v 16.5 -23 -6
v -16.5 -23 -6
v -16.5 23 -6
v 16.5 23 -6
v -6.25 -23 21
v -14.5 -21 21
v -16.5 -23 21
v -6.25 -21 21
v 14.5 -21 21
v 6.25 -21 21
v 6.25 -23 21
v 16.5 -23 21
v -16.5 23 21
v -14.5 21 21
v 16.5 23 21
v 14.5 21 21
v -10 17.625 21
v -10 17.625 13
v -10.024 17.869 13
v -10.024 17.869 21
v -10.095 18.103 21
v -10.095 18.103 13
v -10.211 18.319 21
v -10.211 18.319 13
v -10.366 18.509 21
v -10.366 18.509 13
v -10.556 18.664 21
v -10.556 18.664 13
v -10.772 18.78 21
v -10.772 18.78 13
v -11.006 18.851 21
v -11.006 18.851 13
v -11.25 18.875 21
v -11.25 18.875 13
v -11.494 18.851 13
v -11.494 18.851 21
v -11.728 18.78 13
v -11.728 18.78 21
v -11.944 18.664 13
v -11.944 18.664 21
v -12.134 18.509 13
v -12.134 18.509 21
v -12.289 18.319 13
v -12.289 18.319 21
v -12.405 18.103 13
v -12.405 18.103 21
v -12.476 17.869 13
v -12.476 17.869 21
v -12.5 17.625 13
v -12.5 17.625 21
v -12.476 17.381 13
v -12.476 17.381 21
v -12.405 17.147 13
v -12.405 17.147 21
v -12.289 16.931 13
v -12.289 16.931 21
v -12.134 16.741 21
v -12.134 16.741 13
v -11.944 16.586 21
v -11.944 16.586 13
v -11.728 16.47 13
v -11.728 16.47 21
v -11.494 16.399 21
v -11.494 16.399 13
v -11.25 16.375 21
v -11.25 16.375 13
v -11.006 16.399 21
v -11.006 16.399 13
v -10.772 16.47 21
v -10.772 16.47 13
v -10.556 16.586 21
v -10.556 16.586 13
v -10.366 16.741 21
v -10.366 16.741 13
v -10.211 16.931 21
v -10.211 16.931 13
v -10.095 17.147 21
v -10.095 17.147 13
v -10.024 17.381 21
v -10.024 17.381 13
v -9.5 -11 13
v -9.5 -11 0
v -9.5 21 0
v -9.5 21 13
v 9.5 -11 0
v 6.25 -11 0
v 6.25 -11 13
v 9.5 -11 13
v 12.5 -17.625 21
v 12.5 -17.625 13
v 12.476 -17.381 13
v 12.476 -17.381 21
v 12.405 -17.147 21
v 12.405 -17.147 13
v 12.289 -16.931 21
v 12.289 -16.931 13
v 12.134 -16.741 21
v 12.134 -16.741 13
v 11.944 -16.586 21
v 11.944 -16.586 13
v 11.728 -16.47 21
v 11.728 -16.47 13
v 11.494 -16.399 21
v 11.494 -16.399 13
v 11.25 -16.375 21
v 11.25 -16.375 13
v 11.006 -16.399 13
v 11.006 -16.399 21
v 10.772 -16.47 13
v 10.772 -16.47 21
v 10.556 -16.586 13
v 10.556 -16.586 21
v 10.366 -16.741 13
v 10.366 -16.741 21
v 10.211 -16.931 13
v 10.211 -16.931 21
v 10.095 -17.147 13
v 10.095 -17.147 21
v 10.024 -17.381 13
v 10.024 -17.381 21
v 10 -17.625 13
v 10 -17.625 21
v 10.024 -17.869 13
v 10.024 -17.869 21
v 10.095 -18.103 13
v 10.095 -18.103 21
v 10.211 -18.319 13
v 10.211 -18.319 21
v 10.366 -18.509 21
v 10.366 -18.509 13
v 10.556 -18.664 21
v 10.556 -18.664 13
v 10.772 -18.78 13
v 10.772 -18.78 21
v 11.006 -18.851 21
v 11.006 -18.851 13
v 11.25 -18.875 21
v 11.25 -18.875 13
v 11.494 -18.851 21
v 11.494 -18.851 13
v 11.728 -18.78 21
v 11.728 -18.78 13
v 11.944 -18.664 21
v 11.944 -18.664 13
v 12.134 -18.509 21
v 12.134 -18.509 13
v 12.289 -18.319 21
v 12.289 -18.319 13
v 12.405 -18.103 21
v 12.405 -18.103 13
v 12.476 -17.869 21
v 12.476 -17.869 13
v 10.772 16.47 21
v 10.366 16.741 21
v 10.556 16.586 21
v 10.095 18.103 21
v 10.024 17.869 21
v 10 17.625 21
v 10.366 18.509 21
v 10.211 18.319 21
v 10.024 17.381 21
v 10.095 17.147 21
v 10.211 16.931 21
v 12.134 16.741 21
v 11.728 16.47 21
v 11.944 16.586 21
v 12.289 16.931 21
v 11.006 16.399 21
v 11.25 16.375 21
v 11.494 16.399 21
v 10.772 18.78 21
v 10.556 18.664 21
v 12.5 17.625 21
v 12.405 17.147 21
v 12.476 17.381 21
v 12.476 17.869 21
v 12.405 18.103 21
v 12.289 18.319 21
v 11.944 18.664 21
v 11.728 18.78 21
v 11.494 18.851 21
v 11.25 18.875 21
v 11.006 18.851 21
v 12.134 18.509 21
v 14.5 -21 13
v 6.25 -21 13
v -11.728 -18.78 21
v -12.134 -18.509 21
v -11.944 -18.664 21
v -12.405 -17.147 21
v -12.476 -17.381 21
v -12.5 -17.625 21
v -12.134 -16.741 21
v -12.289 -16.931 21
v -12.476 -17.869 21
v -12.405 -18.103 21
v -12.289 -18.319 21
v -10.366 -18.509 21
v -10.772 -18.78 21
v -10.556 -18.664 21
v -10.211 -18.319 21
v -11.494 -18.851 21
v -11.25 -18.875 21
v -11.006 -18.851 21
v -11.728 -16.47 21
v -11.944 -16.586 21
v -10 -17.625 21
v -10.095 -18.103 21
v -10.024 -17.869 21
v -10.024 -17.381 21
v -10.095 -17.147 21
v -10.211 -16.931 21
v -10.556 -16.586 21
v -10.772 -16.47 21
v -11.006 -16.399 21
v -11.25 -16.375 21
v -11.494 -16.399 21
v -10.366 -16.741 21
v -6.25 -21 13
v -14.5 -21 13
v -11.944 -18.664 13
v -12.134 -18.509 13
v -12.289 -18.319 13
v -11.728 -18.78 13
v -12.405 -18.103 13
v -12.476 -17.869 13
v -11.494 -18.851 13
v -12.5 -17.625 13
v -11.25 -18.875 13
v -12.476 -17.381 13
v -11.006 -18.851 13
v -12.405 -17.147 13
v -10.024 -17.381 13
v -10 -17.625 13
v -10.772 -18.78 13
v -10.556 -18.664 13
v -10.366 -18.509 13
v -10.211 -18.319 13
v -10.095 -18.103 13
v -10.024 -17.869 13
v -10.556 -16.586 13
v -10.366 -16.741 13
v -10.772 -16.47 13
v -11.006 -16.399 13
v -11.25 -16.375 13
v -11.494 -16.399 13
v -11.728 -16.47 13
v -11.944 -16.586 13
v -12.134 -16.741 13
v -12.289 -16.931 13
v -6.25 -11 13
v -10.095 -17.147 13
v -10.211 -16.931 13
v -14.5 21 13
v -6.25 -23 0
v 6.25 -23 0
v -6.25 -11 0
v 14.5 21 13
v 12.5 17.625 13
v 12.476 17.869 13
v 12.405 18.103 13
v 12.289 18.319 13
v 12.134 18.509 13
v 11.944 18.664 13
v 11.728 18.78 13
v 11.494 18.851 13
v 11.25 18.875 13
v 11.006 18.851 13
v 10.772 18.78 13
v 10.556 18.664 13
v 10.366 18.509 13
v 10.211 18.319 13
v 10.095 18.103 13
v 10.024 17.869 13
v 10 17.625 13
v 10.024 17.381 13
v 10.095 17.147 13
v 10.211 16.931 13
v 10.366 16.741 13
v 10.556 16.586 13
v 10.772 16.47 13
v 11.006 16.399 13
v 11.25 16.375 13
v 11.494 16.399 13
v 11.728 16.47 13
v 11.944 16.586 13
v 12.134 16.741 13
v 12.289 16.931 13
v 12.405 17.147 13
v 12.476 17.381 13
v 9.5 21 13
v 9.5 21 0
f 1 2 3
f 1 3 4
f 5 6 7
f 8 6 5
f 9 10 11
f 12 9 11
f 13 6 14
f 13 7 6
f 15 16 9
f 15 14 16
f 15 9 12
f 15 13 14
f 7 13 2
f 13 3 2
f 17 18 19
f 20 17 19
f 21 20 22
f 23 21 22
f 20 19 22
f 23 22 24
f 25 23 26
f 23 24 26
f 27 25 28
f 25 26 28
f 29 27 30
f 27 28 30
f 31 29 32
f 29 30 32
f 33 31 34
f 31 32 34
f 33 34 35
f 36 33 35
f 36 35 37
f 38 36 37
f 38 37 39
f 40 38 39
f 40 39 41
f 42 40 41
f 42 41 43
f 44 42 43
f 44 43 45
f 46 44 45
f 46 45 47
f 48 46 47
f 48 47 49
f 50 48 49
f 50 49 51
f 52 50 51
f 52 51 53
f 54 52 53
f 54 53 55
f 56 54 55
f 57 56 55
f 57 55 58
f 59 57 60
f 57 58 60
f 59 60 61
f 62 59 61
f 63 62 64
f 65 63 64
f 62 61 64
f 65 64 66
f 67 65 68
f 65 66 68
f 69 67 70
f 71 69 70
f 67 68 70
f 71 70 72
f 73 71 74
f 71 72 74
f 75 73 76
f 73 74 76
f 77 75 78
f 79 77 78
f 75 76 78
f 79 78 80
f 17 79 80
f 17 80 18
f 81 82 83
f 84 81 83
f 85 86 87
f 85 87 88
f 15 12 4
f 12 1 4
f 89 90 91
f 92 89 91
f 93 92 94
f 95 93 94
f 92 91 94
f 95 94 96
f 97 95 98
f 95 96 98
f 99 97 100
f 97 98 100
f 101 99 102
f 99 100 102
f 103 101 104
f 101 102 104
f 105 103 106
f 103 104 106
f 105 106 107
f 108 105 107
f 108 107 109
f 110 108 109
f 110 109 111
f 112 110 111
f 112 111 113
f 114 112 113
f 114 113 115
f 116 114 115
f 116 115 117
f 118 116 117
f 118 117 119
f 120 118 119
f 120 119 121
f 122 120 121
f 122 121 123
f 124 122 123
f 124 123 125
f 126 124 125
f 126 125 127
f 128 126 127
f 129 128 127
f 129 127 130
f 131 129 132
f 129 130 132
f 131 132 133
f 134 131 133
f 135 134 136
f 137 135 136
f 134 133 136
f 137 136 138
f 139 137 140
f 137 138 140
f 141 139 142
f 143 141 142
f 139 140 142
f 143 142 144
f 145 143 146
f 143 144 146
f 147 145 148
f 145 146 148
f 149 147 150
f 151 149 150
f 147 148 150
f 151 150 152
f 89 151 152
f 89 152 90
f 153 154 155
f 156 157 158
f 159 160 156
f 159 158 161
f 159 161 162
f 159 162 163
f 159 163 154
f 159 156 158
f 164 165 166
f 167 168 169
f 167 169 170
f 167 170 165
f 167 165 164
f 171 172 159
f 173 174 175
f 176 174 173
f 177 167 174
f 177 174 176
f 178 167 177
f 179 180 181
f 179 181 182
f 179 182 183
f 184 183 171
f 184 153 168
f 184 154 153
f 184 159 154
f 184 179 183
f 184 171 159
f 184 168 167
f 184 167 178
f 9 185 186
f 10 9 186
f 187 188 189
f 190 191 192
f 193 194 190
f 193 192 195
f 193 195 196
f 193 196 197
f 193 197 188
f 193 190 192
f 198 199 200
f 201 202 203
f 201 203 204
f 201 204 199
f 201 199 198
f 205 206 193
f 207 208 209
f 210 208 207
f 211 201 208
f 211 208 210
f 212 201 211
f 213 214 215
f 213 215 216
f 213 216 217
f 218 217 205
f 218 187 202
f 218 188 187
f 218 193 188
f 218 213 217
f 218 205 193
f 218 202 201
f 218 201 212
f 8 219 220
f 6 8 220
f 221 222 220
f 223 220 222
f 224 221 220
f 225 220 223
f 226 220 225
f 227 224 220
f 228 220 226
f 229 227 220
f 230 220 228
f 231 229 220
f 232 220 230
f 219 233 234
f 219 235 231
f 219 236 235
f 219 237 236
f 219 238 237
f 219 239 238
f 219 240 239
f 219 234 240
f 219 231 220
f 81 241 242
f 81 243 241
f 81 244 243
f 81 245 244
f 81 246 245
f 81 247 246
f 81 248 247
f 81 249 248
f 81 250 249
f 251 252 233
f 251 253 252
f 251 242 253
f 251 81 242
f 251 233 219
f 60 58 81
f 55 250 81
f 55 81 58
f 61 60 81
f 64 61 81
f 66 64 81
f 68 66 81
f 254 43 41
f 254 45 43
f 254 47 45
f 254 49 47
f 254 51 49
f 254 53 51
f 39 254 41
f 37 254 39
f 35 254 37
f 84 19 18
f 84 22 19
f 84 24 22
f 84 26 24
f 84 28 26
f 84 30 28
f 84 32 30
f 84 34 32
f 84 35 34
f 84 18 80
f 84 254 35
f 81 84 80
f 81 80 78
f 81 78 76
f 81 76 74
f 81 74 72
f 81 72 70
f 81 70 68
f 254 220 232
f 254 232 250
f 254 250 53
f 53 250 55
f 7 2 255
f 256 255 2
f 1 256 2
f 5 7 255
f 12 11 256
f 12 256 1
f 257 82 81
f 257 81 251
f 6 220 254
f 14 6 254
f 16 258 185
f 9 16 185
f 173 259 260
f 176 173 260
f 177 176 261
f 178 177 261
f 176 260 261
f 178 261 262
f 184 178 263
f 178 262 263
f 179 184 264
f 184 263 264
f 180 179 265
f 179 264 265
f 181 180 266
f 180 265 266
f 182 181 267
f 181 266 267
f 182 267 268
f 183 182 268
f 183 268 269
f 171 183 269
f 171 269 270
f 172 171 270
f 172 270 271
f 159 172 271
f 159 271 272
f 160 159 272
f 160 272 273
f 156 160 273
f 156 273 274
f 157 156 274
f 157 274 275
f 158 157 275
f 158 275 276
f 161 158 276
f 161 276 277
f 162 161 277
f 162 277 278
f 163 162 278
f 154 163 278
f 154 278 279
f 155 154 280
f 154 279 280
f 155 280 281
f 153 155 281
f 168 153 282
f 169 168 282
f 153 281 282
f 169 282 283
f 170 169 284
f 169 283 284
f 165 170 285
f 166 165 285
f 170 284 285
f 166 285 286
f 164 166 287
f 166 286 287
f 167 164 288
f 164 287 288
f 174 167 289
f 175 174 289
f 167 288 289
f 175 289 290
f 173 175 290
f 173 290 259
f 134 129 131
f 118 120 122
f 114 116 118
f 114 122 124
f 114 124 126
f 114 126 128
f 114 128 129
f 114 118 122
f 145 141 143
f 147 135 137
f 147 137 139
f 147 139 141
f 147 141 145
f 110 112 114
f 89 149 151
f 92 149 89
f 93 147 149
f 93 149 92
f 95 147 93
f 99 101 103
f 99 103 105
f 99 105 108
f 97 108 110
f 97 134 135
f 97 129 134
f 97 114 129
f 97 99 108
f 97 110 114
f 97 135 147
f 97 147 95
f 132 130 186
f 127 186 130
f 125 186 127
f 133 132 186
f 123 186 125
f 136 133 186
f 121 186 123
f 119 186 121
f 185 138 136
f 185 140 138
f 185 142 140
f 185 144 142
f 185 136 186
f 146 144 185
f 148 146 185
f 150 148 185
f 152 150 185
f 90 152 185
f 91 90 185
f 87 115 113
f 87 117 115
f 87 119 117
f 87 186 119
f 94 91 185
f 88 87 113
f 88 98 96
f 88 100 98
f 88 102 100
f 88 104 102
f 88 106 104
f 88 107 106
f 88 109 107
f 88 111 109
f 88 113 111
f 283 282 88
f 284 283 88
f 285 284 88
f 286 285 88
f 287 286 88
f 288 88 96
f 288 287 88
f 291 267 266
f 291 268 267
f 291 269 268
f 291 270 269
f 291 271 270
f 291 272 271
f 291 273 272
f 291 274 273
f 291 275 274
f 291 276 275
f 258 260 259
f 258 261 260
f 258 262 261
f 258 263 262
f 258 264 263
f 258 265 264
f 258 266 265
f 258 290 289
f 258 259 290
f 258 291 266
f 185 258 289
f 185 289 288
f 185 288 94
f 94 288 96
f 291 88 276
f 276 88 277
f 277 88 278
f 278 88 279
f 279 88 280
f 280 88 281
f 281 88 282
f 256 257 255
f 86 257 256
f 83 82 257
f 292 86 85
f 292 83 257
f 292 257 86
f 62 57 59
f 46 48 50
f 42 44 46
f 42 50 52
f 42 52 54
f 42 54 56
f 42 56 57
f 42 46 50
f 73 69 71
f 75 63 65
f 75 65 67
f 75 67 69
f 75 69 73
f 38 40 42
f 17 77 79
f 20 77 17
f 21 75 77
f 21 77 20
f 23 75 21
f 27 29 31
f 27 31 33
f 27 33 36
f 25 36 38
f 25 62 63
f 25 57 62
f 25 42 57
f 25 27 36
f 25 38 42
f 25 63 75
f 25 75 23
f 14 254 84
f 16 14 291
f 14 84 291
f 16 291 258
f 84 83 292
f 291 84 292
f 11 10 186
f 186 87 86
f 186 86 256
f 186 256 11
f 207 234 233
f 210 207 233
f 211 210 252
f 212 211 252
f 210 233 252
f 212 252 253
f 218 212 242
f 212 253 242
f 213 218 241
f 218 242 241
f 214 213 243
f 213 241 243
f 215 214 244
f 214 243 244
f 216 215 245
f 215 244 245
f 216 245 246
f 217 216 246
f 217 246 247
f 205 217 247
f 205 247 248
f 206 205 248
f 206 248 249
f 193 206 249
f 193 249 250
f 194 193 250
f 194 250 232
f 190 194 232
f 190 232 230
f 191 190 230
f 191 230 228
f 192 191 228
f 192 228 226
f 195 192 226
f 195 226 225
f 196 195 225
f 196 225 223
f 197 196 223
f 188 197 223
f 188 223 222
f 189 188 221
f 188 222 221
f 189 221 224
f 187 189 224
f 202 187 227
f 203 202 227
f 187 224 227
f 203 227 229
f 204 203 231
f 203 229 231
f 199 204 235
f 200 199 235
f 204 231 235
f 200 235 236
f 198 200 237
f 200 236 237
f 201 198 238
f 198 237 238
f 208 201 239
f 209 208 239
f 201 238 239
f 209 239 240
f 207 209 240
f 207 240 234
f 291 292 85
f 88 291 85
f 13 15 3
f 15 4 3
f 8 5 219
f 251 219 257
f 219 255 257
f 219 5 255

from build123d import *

# Parameters (mm, degrees)
F0_R     = 1.25
F0_W     = 12.5
F0_H     = 10
F0_W_2   = 19
F0_H_2   = 2
F0_W_3   = 3.25
F1_DEPTH = 6
F2_DEPTH = 21
F3_DEPTH = 13


with BuildPart() as f1:
    # F0 (on Top) → F1 (new body)
    with BuildSketch(Plane.XY):
        Polygon((9.5, 0), (9.5, 21), (-9.5, 21), (-9.5, 0), (-9.5, -11), (-6.25, -11), (6.25, -11), (9.5, -11), align=None)
        Polygon((14.5, -21), (14.5, 21), (9.5, 21), (9.5, 0), (9.5, -11), (9.5, -21), align=None)
        with Locations((11.25, -17.625)):
            Circle(F0_R, mode=Mode.SUBTRACT)
        with Locations((11.25, 17.625)):
            Circle(F0_R, mode=Mode.SUBTRACT)
        Polygon((-9.5, 0), (-9.5, 21), (-14.5, 21), (-14.5, -21), (-9.5, -21), (-9.5, -11), align=None)
        with Locations((-11.25, -17.625)):
            Circle(F0_R, mode=Mode.SUBTRACT)
        with Locations((-11.25, 17.625)):
            Circle(F0_R, mode=Mode.SUBTRACT)
        with Locations((0, -16)):
            Rectangle(F0_W, F0_H)
        Polygon((9.5, 21), (14.5, 21), (14.5, -21), (9.5, -21), (9.5, -23), (16.5, -23), (16.5, 23), (9.5, 23), align=None)
        Polygon((-14.5, 21), (-9.5, 21), (-9.5, 23), (-16.5, 23), (-16.5, -23), (-9.5, -23), (-9.5, -21), (-14.5, -21), align=None)
        with Locations((0, 22)):
            Rectangle(F0_W_2, F0_H_2)
        with Locations((7.875, -16)):
            Rectangle(F0_W_3, F0_H)
        with Locations((-7.875, -16)):
            Rectangle(F0_W_3, F0_H)
        with Locations((0, -22)):
            Rectangle(F0_W, F0_H_2)
        with Locations((7.875, -22)):
            Rectangle(F0_W_3, F0_H_2)
        with Locations((-7.875, -22)):
            Rectangle(F0_W_3, F0_H_2)
        with Locations((-11.25, 17.625)):
            Circle(F0_R)
        with Locations((11.25, 17.625)):
            Circle(F0_R)
        with Locations((-11.25, -17.625)):
            Circle(F0_R)
        with Locations((11.25, -17.625)):
            Circle(F0_R)
    extrude(amount=-F1_DEPTH)

    # F0 (on Top) → F2 (join)
    with BuildSketch(Plane.XY):
        Polygon((9.5, 21), (14.5, 21), (14.5, -21), (9.5, -21), (9.5, -23), (16.5, -23), (16.5, 23), (9.5, 23), align=None)
        Polygon((-14.5, 21), (-9.5, 21), (-9.5, 23), (-16.5, 23), (-16.5, -23), (-9.5, -23), (-9.5, -21), (-14.5, -21), align=None)
        with Locations((11.25, -17.625)):
            Circle(F0_R)
        with Locations((11.25, 17.625)):
            Circle(F0_R)
        with Locations((-11.25, 17.625)):
            Circle(F0_R)
        with Locations((-11.25, -17.625)):
            Circle(F0_R)
        with Locations((0, 22)):
            Rectangle(F0_W_2, F0_H_2)
        with Locations((-7.875, -22)):
            Rectangle(F0_W_3, F0_H_2)
        with Locations((7.875, -22)):
            Rectangle(F0_W_3, F0_H_2)
    extrude(amount=F2_DEPTH)

    # F0 (on Top) → F3 (join)
    with BuildSketch(Plane.XY):
        Polygon((14.5, -21), (14.5, 21), (9.5, 21), (9.5, 0), (9.5, -11), (9.5, -21), align=None)
        with Locations((11.25, -17.625)):
            Circle(F0_R, mode=Mode.SUBTRACT)
        with Locations((11.25, 17.625)):
            Circle(F0_R, mode=Mode.SUBTRACT)
        Polygon((-9.5, 0), (-9.5, 21), (-14.5, 21), (-14.5, -21), (-9.5, -21), (-9.5, -11), align=None)
        with Locations((-11.25, -17.625)):
            Circle(F0_R, mode=Mode.SUBTRACT)
        with Locations((-11.25, 17.625)):
            Circle(F0_R, mode=Mode.SUBTRACT)
        with Locations((-7.875, -16)):
            Rectangle(F0_W_3, F0_H)
        with Locations((-7.875, -22)):
            Rectangle(F0_W_3, F0_H_2)
        with Locations((7.875, -22)):
            Rectangle(F0_W_3, F0_H_2)
        with Locations((7.875, -16)):
            Rectangle(F0_W_3, F0_H)
    extrude(amount=F3_DEPTH)


solid = f1.part
